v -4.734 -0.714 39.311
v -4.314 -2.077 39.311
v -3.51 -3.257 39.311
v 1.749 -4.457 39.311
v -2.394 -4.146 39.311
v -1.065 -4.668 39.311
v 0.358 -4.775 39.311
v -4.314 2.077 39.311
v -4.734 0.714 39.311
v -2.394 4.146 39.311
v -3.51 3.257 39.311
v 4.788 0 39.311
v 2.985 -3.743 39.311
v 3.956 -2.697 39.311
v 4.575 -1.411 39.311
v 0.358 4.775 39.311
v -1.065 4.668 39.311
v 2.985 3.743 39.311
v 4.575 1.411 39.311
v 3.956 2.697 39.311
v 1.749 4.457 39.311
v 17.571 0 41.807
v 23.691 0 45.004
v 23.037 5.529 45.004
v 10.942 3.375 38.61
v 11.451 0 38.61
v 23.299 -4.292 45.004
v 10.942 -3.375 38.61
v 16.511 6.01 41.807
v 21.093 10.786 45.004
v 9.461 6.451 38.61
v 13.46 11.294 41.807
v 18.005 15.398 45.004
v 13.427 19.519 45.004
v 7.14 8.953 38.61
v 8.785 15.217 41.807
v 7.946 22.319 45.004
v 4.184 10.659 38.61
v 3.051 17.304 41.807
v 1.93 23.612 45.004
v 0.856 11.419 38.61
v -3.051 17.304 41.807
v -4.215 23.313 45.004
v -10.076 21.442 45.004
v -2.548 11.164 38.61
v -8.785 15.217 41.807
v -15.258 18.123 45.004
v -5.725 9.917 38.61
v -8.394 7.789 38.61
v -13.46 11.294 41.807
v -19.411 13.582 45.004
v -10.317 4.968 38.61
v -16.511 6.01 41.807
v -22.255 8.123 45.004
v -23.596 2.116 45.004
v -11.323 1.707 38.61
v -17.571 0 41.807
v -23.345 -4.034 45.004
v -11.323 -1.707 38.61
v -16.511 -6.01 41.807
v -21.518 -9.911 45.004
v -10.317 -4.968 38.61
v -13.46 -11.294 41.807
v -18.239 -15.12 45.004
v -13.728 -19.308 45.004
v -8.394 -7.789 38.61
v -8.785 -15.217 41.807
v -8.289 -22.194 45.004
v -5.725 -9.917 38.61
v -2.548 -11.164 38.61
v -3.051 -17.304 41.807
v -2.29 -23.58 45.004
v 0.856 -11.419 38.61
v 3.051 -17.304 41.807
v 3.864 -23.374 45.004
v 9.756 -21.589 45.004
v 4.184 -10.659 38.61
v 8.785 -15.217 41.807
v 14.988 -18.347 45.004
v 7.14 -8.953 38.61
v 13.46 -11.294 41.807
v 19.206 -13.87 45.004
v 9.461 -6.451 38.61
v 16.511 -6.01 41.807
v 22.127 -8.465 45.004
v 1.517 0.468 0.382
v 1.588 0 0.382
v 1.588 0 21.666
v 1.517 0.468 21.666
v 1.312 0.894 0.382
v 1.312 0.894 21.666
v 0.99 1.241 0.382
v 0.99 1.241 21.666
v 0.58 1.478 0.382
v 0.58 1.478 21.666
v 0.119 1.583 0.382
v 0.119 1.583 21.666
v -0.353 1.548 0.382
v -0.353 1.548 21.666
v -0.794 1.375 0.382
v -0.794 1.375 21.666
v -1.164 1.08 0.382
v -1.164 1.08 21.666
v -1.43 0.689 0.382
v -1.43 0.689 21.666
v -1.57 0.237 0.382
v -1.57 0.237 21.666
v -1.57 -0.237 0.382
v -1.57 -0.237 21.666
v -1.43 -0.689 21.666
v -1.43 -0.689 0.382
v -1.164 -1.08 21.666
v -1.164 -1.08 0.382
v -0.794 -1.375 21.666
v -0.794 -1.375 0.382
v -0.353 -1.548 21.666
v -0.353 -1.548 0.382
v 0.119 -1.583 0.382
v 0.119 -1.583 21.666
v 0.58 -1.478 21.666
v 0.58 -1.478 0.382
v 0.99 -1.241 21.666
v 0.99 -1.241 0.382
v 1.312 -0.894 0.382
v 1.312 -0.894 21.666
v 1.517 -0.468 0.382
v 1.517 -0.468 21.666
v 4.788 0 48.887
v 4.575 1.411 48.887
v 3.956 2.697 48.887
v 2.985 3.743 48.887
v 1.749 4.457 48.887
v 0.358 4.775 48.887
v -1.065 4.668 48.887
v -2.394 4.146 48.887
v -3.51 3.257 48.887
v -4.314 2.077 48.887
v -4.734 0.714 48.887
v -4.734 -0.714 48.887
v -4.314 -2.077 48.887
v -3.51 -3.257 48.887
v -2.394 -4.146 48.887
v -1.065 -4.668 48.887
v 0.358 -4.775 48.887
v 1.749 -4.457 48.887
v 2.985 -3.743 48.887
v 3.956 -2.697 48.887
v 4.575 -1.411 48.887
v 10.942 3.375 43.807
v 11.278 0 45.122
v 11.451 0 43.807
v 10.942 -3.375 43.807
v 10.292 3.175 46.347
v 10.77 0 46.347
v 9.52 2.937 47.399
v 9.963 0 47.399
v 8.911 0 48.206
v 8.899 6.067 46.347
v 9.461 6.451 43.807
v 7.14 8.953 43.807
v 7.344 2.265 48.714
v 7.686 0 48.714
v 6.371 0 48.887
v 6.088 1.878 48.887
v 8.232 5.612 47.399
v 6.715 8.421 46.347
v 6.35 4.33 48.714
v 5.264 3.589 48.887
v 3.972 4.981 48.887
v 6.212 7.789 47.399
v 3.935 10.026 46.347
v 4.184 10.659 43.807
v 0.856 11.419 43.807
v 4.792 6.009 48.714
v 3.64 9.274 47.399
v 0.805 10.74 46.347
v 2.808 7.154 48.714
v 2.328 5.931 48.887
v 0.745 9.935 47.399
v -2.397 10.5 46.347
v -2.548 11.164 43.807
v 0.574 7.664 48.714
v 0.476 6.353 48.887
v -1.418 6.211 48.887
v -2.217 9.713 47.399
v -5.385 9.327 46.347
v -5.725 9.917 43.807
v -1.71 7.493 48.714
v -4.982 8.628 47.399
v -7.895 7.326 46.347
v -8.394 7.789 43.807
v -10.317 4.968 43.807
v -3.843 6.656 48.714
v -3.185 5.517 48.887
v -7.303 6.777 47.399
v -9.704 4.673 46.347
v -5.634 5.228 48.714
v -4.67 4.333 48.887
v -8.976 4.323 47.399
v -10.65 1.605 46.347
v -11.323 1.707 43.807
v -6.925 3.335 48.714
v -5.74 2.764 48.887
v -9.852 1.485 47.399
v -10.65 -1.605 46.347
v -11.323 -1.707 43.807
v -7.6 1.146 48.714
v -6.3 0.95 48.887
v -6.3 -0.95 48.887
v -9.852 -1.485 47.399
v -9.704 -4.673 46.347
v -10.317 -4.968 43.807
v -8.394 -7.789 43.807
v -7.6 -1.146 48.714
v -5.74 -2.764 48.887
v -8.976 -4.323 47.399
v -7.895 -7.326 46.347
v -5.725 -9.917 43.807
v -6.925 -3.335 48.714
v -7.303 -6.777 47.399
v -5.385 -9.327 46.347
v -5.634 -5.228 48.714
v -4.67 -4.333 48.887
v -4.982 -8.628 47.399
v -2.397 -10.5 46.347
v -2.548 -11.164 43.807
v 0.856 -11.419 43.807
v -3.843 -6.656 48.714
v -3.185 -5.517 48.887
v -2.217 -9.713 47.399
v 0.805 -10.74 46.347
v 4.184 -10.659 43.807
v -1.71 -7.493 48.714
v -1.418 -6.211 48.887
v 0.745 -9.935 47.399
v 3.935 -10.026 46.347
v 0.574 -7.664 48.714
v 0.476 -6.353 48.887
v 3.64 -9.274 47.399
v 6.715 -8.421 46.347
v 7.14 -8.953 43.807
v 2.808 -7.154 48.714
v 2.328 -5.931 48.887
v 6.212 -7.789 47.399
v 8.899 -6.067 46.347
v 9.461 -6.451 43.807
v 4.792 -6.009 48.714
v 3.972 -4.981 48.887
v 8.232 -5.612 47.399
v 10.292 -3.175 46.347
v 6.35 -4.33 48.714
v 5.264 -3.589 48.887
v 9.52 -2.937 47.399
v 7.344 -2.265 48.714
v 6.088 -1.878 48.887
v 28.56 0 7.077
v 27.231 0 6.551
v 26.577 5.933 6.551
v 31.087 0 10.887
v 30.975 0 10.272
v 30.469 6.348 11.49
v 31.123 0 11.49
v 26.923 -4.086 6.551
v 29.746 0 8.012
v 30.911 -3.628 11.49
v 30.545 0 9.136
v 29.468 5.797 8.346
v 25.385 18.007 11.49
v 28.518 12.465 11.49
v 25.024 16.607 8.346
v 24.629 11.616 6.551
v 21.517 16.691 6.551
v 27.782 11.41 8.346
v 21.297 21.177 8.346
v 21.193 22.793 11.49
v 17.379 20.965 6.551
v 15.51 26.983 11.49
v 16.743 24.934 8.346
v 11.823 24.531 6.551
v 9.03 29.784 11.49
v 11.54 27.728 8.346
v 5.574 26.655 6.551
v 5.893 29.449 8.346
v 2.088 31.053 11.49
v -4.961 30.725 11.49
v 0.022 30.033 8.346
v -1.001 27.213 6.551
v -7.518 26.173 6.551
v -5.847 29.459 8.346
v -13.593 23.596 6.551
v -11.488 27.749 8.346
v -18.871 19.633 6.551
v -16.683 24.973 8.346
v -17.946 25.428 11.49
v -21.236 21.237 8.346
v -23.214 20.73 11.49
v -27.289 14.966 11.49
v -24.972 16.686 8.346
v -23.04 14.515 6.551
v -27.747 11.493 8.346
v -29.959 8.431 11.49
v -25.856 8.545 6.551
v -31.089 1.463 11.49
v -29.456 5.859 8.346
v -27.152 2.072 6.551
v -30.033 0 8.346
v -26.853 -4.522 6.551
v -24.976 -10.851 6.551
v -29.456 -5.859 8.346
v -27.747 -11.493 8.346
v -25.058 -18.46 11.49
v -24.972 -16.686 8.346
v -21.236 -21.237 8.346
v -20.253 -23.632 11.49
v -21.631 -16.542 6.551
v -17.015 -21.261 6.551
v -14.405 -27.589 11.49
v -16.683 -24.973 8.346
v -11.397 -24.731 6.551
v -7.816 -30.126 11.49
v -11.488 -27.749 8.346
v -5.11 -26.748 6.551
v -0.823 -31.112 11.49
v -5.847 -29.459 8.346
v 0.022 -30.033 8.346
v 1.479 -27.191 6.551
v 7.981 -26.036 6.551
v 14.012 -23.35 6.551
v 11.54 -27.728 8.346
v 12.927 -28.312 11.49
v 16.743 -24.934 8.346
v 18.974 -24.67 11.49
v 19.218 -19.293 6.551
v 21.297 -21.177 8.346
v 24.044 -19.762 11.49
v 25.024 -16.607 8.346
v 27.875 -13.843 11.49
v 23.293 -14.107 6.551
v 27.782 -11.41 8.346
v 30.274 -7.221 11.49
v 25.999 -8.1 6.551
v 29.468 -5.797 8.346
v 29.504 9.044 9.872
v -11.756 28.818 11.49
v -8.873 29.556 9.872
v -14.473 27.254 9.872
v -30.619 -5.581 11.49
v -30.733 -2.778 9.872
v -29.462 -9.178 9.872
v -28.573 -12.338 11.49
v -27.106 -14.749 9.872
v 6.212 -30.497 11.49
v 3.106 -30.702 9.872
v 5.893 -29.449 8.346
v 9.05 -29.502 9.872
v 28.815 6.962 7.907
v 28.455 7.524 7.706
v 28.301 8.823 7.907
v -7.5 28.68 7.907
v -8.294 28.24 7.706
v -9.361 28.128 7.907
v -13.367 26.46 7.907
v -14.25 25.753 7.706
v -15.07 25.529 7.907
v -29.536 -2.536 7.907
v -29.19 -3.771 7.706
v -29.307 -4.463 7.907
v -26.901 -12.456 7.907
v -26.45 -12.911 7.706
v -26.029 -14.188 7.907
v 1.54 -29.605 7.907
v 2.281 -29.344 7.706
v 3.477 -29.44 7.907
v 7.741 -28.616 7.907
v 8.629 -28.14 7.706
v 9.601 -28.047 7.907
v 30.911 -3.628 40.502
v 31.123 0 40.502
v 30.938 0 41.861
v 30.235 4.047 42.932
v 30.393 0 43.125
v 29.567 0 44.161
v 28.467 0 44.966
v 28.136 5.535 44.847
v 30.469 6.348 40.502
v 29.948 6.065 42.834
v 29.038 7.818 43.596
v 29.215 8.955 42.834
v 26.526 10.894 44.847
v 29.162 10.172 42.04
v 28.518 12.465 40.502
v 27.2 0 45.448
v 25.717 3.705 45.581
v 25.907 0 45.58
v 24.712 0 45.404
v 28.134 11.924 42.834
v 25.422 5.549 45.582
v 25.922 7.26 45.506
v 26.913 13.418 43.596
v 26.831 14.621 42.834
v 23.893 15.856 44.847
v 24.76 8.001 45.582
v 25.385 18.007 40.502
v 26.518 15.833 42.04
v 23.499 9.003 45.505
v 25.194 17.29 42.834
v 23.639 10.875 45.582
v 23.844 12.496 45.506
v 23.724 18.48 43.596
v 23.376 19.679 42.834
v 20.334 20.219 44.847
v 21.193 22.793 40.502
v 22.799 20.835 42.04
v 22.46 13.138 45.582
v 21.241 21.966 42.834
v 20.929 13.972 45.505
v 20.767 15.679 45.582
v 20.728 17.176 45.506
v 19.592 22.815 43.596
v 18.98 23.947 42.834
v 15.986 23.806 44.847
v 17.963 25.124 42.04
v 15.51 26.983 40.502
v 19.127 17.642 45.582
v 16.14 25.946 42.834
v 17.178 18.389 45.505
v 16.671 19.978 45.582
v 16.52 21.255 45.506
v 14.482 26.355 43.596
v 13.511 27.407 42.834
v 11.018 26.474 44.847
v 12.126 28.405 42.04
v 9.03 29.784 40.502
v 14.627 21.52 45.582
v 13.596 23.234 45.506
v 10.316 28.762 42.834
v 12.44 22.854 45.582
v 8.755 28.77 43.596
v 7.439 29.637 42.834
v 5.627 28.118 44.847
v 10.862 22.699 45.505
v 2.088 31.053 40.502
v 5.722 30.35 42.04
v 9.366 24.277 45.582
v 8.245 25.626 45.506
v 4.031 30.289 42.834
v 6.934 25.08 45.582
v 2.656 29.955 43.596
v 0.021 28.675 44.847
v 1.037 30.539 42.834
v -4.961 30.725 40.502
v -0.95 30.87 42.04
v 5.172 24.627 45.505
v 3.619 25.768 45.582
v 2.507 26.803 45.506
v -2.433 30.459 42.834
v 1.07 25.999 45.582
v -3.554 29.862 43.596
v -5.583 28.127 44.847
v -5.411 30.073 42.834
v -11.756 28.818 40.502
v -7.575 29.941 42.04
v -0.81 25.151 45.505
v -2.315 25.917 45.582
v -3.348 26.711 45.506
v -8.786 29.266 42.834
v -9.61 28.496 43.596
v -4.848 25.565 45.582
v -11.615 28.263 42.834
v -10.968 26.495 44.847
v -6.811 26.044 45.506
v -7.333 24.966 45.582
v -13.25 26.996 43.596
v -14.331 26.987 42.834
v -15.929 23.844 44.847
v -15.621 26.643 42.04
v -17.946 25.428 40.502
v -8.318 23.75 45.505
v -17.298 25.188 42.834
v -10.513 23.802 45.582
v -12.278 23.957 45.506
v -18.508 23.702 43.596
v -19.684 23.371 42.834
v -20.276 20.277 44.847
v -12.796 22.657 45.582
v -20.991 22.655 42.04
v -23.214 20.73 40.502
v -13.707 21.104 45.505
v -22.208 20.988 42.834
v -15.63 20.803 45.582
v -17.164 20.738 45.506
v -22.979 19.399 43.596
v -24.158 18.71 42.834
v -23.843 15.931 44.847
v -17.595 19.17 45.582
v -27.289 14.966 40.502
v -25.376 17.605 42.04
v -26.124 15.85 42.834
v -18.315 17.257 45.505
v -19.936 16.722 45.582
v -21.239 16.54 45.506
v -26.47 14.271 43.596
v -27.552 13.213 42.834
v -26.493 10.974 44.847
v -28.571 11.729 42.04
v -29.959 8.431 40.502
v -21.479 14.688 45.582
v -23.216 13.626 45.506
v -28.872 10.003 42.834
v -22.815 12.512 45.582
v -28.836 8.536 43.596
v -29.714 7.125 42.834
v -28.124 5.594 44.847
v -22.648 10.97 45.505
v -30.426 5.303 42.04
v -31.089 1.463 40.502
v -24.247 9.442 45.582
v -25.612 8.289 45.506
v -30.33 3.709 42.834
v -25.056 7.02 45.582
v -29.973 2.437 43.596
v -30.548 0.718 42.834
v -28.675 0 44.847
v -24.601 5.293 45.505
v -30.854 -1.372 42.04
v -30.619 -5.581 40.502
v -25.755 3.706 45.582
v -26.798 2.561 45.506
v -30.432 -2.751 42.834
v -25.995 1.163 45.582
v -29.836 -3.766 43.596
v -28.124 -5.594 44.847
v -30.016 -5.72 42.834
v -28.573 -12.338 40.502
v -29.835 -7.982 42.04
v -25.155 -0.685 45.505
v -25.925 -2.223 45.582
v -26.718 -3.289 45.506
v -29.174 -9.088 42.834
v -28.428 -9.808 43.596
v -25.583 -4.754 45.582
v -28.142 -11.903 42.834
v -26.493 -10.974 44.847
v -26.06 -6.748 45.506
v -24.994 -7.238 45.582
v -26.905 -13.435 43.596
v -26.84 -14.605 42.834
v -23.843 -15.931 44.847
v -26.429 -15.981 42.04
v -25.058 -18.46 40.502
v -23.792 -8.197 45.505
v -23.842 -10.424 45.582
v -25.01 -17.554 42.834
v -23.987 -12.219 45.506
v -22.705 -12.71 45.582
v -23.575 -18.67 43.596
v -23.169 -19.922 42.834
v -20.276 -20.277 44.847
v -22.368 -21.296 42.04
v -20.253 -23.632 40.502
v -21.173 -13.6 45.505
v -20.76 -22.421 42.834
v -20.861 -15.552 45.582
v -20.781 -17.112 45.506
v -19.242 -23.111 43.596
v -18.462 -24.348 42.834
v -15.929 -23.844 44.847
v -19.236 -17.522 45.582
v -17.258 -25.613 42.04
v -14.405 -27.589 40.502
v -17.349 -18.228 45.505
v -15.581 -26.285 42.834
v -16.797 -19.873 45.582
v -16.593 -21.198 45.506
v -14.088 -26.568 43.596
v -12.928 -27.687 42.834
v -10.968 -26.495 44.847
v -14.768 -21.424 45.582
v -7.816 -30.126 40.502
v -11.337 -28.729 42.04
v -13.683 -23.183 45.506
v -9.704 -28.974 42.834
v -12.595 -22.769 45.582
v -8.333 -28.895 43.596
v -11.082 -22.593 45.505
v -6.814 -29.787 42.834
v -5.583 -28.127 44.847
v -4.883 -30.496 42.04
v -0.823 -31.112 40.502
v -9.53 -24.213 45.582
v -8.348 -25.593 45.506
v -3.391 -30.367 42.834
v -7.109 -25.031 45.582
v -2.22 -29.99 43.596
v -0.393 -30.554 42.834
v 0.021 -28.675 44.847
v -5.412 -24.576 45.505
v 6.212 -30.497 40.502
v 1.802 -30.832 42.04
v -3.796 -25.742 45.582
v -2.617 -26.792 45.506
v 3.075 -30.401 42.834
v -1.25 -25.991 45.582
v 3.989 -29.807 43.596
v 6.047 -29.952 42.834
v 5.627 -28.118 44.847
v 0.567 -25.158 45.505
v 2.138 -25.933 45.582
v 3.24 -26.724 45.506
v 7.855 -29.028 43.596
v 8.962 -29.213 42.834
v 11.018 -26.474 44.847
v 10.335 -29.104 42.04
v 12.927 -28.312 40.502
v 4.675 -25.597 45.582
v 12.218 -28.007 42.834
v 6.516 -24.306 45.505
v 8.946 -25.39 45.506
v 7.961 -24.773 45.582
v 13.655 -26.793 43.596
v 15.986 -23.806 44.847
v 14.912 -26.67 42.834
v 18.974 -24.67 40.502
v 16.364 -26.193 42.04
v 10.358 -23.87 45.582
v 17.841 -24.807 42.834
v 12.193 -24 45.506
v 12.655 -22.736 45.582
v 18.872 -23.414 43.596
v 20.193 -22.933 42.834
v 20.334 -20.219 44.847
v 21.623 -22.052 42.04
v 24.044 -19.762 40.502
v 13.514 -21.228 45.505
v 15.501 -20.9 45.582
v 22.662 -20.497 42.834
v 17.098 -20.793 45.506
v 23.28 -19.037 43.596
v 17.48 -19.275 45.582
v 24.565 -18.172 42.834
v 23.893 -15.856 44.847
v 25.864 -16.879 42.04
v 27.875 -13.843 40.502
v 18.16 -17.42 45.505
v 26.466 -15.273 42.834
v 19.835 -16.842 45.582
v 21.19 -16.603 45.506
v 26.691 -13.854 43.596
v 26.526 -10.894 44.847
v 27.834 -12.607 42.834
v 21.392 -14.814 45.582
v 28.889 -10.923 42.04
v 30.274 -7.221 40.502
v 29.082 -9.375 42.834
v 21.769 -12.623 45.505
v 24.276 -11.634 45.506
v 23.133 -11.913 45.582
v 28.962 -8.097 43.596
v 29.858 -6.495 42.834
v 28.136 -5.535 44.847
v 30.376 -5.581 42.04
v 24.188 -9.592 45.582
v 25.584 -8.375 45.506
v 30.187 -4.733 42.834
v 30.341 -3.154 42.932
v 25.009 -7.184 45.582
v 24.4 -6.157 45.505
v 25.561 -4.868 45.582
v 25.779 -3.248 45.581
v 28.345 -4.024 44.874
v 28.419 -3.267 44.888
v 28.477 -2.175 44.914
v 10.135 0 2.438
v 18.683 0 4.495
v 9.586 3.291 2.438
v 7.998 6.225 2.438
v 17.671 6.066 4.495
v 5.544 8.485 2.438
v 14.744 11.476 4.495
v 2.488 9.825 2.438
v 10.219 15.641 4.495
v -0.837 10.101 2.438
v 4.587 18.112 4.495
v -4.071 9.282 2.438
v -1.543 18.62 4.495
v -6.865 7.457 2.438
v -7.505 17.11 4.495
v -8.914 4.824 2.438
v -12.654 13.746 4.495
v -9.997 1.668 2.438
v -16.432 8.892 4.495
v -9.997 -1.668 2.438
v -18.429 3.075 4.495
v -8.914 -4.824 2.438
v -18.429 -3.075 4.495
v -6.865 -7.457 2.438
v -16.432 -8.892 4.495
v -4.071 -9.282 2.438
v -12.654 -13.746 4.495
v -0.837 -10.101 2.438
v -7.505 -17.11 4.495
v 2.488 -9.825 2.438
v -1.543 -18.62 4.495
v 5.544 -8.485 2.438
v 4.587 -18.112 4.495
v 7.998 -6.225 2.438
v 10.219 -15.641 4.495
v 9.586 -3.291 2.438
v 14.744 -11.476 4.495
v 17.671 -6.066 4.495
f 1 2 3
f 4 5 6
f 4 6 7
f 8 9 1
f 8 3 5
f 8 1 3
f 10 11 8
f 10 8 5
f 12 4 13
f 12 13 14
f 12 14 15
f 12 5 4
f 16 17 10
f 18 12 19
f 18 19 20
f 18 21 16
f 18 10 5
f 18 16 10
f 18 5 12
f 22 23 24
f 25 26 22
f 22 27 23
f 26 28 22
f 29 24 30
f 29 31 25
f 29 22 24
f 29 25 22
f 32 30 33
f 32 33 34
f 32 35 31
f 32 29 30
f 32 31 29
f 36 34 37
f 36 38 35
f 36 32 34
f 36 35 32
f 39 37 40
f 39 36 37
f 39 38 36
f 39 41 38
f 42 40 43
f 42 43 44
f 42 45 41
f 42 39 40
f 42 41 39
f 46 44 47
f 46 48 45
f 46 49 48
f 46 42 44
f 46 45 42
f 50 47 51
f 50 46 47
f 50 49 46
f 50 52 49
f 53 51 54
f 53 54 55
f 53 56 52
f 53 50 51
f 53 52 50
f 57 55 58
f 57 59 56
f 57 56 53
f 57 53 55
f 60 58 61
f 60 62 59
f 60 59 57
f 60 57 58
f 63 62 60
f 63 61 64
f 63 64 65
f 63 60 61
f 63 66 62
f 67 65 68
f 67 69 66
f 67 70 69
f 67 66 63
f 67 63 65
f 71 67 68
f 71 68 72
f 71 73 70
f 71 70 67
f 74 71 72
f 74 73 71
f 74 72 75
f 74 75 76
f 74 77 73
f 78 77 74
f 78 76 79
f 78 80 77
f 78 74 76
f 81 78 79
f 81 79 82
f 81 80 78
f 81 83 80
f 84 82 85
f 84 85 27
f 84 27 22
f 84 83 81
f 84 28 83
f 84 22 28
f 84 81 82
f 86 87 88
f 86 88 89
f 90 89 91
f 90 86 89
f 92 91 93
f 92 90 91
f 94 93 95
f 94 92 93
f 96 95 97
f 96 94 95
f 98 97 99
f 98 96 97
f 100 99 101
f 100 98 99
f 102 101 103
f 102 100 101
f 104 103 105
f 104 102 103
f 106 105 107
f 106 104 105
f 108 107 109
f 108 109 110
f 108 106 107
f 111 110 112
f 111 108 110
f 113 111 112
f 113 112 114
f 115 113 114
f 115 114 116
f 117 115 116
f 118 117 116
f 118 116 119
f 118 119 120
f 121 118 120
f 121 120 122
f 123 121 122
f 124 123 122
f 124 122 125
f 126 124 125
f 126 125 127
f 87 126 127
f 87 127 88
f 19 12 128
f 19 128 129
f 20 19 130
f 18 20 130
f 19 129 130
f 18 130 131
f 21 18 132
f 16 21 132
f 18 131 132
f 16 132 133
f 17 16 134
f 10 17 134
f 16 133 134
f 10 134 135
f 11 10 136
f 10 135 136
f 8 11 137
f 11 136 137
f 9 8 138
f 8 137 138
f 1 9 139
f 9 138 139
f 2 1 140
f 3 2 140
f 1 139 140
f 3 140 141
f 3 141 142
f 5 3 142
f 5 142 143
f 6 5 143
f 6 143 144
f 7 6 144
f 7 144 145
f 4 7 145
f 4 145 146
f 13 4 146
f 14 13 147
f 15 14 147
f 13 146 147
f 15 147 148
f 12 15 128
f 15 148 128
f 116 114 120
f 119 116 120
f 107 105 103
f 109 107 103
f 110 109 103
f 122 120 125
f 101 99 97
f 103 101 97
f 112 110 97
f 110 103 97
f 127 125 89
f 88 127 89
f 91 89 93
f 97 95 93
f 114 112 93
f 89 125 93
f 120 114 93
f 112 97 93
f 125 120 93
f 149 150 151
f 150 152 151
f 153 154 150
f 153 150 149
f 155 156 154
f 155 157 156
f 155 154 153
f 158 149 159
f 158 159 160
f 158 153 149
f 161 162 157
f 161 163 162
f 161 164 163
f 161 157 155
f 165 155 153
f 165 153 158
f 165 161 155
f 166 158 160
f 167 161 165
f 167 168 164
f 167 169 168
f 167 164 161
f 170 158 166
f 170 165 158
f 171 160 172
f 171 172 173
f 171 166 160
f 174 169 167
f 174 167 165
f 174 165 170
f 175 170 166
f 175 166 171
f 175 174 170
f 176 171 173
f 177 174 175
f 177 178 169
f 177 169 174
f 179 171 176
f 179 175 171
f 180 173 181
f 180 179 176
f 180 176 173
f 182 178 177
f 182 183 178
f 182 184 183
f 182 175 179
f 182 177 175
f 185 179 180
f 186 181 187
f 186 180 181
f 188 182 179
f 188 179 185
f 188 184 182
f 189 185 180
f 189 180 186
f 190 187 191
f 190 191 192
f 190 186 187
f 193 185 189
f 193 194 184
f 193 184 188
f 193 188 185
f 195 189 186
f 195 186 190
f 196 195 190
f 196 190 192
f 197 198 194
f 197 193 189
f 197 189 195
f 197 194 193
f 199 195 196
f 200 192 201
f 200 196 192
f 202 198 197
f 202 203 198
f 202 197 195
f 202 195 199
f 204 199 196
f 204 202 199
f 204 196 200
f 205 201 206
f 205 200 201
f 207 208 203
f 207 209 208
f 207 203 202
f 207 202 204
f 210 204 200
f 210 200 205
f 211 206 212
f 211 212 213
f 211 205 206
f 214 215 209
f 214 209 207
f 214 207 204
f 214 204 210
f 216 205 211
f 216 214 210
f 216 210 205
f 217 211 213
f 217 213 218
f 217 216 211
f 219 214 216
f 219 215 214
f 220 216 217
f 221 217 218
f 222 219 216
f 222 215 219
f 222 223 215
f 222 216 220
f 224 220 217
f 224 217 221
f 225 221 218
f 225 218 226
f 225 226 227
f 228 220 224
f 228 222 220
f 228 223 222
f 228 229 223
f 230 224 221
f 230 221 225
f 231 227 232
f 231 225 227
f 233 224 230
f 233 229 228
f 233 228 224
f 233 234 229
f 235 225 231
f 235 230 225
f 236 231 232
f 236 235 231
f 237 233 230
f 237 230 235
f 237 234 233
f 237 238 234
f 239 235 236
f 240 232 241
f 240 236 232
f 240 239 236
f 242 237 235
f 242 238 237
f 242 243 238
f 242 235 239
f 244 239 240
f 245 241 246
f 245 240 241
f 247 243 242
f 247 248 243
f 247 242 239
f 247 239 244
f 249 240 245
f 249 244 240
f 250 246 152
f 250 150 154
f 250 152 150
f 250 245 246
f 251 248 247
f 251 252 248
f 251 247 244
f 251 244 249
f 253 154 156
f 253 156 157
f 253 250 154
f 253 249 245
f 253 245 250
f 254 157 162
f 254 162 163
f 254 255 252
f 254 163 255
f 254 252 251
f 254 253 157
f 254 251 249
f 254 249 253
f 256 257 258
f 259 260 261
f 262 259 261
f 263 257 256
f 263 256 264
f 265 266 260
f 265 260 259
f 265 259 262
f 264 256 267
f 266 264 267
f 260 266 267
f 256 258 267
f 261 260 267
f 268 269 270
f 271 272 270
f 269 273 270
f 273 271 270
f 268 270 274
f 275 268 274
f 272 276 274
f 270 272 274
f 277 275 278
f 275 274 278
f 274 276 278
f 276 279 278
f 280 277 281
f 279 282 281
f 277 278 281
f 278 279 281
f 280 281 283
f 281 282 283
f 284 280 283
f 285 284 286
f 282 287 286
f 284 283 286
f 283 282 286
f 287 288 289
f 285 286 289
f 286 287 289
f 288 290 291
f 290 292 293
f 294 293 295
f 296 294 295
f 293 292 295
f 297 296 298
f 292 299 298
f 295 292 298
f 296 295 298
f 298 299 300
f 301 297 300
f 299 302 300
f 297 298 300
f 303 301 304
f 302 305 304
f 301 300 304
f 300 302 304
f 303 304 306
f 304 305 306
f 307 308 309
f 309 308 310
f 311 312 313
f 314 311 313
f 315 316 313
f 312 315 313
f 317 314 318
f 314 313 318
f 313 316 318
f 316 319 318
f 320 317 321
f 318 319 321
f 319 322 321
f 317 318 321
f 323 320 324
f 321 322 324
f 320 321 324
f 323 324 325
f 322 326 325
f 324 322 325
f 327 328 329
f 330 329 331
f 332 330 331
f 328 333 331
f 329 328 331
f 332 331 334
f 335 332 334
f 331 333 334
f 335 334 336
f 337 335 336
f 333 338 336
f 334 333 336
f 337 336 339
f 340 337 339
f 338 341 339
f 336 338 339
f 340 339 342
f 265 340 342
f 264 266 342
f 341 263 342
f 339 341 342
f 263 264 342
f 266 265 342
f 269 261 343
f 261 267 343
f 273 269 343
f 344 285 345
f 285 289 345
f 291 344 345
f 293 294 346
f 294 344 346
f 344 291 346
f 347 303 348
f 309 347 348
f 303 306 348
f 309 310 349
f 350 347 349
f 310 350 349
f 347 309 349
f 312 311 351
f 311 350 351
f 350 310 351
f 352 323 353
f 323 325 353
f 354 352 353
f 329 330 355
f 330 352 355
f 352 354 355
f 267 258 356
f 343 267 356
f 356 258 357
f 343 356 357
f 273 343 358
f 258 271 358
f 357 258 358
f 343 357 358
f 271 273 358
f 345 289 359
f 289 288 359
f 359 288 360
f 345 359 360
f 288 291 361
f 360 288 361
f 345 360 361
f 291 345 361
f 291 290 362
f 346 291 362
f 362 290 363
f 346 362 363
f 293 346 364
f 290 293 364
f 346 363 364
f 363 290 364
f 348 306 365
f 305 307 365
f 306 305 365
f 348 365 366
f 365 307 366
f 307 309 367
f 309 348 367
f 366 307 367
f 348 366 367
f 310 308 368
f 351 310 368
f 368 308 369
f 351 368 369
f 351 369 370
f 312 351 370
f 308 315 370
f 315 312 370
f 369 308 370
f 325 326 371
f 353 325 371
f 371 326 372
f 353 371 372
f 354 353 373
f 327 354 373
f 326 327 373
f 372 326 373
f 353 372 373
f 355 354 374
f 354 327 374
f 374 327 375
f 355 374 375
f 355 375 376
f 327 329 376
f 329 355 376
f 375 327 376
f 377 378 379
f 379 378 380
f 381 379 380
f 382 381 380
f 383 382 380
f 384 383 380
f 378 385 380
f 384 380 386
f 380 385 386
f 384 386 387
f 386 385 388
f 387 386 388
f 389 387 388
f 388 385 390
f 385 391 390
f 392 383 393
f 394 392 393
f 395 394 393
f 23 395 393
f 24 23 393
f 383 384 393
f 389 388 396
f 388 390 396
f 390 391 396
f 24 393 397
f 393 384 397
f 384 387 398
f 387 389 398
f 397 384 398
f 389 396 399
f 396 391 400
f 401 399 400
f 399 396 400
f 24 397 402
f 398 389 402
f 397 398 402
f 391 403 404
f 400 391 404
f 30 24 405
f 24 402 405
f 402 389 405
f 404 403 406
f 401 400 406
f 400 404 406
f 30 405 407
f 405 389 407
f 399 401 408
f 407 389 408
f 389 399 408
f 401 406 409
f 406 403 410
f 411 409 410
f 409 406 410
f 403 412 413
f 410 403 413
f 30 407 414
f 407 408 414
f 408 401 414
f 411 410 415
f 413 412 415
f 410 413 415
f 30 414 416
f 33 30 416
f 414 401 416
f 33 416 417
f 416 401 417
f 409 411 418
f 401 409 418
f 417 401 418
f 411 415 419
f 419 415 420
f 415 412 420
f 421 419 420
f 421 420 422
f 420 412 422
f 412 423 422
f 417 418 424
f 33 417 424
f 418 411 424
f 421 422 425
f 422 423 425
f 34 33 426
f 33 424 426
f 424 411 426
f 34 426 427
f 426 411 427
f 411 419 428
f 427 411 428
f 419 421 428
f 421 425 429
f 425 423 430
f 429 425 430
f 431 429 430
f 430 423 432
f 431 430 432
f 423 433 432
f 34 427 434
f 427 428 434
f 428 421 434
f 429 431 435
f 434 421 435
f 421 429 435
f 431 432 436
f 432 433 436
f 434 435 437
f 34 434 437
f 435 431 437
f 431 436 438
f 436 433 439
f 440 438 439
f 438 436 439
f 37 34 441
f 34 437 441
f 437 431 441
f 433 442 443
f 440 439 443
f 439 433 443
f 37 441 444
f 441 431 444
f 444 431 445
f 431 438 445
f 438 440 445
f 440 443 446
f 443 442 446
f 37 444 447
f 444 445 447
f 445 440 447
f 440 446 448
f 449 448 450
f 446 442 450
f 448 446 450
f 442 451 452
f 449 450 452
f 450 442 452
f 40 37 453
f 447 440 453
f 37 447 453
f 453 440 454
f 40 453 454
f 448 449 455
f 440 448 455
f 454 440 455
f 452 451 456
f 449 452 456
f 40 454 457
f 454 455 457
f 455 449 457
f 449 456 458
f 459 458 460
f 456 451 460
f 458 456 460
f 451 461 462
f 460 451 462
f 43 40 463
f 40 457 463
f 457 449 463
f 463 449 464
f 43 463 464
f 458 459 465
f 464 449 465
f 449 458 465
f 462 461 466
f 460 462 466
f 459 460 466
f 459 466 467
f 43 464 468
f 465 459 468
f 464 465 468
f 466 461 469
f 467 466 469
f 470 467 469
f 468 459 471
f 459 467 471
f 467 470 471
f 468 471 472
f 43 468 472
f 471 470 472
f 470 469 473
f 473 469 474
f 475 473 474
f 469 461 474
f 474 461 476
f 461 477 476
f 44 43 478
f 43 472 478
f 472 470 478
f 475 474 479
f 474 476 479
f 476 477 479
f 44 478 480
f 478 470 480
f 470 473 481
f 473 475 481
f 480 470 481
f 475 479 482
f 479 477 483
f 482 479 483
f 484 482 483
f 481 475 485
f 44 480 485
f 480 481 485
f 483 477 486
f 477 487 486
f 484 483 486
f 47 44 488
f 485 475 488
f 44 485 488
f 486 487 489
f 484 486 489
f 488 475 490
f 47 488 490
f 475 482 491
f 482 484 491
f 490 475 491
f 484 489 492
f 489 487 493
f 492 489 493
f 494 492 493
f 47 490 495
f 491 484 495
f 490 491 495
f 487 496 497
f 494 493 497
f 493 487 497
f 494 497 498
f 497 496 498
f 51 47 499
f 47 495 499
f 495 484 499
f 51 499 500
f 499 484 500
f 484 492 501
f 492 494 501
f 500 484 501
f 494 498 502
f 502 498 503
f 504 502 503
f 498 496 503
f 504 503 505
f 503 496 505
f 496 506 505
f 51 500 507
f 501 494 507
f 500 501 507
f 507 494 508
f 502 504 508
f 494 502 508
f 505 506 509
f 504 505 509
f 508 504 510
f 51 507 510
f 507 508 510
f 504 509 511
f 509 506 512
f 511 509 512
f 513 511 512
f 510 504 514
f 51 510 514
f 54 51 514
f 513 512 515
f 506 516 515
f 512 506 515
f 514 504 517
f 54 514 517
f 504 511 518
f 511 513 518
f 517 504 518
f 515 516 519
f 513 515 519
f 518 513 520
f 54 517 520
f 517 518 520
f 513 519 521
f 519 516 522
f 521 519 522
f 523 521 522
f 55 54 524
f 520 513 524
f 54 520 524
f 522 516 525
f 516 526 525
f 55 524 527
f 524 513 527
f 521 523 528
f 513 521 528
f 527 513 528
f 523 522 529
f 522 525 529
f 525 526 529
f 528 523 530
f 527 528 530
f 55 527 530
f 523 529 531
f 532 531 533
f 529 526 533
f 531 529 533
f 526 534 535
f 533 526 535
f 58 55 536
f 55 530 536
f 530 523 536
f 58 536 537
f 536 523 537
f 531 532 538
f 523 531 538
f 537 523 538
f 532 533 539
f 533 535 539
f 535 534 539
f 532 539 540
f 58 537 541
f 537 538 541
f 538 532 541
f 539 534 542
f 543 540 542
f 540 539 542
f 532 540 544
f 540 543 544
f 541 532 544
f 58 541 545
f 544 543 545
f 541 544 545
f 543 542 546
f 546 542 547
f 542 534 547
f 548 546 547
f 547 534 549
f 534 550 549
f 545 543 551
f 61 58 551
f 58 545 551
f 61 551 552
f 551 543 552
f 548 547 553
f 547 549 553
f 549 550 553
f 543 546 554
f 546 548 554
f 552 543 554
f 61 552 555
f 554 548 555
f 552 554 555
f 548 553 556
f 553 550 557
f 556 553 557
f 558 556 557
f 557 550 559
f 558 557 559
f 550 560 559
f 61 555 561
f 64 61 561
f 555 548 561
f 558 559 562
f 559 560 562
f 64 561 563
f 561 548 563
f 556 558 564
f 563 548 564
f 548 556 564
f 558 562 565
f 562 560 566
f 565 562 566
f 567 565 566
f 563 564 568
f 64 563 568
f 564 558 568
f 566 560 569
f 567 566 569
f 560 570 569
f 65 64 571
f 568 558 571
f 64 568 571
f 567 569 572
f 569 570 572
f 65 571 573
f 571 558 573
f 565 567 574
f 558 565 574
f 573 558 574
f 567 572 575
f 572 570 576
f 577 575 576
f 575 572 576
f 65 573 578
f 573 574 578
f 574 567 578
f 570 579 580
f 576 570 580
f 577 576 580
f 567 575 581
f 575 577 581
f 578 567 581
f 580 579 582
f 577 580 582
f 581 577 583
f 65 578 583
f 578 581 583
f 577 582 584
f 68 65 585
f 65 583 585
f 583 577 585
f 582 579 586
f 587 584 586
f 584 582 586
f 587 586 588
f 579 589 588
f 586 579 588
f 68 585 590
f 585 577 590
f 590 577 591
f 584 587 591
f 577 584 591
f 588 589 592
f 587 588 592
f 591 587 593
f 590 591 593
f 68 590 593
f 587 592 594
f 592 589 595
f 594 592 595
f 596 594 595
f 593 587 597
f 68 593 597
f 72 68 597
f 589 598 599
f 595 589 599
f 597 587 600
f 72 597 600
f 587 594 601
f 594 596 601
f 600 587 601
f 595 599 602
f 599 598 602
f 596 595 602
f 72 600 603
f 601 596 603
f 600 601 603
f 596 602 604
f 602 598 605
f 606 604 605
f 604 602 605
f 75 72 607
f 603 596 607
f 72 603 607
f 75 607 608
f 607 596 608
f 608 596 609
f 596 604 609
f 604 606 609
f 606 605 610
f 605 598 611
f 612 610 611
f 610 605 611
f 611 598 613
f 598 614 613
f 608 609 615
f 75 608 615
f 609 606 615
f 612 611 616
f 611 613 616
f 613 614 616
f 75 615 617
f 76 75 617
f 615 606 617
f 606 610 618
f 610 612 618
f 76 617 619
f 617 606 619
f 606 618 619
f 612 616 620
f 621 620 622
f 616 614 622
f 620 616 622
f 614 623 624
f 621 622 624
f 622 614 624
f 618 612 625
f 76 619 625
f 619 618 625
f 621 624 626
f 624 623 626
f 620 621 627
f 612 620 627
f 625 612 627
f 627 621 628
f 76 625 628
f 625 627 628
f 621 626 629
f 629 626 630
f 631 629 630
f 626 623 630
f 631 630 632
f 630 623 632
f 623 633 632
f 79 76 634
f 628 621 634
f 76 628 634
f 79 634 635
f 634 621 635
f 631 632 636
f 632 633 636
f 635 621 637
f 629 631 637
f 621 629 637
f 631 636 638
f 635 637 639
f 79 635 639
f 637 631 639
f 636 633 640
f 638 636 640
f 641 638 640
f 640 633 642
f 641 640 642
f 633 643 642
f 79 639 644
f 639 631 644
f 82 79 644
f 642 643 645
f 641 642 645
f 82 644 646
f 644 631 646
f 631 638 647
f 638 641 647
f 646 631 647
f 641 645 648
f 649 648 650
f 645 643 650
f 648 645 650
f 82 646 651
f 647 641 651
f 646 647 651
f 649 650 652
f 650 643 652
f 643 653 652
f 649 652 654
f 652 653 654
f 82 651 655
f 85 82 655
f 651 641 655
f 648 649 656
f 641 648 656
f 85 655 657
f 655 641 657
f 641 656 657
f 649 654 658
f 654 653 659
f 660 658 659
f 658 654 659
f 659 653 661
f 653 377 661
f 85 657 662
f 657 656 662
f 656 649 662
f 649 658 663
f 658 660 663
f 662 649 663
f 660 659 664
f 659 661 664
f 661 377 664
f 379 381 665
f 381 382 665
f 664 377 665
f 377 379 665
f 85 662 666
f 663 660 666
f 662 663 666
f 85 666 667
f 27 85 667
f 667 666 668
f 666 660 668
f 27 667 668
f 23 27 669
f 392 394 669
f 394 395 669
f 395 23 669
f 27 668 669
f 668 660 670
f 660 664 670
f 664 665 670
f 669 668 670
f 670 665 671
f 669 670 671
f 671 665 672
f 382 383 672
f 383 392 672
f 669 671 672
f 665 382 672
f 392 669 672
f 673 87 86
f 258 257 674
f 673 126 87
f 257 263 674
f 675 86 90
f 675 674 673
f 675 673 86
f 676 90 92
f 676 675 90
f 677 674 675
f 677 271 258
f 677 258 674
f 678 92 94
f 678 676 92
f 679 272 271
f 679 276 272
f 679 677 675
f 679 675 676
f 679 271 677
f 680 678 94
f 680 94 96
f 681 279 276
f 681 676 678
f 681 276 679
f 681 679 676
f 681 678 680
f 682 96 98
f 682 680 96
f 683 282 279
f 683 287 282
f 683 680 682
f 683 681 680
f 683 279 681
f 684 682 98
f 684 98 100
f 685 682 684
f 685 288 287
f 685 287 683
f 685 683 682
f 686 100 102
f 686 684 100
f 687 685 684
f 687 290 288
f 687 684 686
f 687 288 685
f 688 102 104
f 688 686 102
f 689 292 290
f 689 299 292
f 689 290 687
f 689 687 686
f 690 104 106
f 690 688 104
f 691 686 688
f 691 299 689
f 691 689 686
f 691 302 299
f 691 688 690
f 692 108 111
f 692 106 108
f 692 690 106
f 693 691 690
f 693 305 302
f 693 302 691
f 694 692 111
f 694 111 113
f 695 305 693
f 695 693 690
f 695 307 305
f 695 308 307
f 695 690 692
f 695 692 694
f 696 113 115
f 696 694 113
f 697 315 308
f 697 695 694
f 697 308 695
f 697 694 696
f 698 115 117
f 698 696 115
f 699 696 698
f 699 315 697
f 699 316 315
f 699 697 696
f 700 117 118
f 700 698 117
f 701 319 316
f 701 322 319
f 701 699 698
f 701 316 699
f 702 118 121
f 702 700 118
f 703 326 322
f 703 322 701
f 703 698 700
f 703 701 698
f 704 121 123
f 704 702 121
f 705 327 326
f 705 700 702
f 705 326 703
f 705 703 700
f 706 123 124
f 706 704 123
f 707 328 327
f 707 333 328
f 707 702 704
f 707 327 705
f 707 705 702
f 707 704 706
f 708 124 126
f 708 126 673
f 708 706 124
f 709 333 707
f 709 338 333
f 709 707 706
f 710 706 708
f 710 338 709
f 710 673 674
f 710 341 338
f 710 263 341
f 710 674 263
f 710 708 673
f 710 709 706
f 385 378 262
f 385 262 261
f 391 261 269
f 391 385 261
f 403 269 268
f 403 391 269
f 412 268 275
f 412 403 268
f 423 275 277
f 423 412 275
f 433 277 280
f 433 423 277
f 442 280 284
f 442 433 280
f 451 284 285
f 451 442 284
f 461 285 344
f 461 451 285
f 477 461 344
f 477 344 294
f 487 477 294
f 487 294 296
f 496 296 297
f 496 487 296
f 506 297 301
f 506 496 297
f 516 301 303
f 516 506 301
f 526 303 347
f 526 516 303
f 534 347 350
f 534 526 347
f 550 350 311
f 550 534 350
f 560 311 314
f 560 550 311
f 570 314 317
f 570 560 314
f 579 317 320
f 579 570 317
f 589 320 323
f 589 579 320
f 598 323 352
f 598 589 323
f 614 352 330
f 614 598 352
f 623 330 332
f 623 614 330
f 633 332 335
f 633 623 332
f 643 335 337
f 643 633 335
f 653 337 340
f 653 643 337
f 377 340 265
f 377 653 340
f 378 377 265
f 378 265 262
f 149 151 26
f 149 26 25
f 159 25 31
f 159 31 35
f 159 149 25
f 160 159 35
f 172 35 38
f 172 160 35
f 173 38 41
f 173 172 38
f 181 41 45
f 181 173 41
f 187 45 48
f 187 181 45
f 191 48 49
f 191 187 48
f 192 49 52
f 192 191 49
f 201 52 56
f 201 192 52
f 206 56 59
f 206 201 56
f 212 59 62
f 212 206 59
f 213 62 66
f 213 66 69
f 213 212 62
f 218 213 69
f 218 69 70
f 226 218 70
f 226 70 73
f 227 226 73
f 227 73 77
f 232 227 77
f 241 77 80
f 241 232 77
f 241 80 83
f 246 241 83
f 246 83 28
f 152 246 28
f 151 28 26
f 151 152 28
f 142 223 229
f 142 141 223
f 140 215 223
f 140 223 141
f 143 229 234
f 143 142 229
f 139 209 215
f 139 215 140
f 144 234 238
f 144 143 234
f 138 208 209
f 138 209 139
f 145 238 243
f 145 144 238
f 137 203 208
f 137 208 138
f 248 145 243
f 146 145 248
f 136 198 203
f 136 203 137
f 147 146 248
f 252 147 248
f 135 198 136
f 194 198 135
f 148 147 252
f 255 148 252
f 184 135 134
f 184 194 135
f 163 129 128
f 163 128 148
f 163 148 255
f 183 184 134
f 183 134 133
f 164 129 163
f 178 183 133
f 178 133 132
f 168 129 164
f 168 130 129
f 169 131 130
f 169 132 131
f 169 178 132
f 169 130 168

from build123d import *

# Parameters (mm, degrees)
F2_R     = 4.7879
F3_DEPTH = 9.5758
F4_R     = 5.08
F5_R     = 1.5875
F6_DEPTH = 21.6662


with BuildPart() as f1:
    # F0 (on Front) → F1 (revolve)
    with BuildSketch(Plane.XZ):
        Polygon((0, 48.886847), (0, 0), (31.123154, 7.487174), (31.123154, 48.886847), (11.450971, 38.610332), (11.450971, 48.886847), align=None)
    revolve(axis=Axis((0, 0, 24.443423), (0, 0, 1)))

    # F2 (on face) → F3 (cut)
    with BuildSketch(Plane.XY.offset(48.886847)):
        Circle(F2_R)
    extrude(amount=-F3_DEPTH, mode=Mode.SUBTRACT)

    # F4
    f4_edges = [f1.edges().sort_by_distance(p)[0] for p in [
        (-31.123154, 0, 7.487174),
        (-31.123154, 0, 48.886847),
        (31.123154, 0, 28.18701),
        (-11.450971, 0, 48.886847),
    ]]
    fillet(f4_edges, radius=F4_R)

    # F5 (on Top) → F6 (cut)
    with BuildSketch(Plane.XY):
        Circle(F5_R)
    extrude(amount=F6_DEPTH, mode=Mode.SUBTRACT)


solid = f1.part
